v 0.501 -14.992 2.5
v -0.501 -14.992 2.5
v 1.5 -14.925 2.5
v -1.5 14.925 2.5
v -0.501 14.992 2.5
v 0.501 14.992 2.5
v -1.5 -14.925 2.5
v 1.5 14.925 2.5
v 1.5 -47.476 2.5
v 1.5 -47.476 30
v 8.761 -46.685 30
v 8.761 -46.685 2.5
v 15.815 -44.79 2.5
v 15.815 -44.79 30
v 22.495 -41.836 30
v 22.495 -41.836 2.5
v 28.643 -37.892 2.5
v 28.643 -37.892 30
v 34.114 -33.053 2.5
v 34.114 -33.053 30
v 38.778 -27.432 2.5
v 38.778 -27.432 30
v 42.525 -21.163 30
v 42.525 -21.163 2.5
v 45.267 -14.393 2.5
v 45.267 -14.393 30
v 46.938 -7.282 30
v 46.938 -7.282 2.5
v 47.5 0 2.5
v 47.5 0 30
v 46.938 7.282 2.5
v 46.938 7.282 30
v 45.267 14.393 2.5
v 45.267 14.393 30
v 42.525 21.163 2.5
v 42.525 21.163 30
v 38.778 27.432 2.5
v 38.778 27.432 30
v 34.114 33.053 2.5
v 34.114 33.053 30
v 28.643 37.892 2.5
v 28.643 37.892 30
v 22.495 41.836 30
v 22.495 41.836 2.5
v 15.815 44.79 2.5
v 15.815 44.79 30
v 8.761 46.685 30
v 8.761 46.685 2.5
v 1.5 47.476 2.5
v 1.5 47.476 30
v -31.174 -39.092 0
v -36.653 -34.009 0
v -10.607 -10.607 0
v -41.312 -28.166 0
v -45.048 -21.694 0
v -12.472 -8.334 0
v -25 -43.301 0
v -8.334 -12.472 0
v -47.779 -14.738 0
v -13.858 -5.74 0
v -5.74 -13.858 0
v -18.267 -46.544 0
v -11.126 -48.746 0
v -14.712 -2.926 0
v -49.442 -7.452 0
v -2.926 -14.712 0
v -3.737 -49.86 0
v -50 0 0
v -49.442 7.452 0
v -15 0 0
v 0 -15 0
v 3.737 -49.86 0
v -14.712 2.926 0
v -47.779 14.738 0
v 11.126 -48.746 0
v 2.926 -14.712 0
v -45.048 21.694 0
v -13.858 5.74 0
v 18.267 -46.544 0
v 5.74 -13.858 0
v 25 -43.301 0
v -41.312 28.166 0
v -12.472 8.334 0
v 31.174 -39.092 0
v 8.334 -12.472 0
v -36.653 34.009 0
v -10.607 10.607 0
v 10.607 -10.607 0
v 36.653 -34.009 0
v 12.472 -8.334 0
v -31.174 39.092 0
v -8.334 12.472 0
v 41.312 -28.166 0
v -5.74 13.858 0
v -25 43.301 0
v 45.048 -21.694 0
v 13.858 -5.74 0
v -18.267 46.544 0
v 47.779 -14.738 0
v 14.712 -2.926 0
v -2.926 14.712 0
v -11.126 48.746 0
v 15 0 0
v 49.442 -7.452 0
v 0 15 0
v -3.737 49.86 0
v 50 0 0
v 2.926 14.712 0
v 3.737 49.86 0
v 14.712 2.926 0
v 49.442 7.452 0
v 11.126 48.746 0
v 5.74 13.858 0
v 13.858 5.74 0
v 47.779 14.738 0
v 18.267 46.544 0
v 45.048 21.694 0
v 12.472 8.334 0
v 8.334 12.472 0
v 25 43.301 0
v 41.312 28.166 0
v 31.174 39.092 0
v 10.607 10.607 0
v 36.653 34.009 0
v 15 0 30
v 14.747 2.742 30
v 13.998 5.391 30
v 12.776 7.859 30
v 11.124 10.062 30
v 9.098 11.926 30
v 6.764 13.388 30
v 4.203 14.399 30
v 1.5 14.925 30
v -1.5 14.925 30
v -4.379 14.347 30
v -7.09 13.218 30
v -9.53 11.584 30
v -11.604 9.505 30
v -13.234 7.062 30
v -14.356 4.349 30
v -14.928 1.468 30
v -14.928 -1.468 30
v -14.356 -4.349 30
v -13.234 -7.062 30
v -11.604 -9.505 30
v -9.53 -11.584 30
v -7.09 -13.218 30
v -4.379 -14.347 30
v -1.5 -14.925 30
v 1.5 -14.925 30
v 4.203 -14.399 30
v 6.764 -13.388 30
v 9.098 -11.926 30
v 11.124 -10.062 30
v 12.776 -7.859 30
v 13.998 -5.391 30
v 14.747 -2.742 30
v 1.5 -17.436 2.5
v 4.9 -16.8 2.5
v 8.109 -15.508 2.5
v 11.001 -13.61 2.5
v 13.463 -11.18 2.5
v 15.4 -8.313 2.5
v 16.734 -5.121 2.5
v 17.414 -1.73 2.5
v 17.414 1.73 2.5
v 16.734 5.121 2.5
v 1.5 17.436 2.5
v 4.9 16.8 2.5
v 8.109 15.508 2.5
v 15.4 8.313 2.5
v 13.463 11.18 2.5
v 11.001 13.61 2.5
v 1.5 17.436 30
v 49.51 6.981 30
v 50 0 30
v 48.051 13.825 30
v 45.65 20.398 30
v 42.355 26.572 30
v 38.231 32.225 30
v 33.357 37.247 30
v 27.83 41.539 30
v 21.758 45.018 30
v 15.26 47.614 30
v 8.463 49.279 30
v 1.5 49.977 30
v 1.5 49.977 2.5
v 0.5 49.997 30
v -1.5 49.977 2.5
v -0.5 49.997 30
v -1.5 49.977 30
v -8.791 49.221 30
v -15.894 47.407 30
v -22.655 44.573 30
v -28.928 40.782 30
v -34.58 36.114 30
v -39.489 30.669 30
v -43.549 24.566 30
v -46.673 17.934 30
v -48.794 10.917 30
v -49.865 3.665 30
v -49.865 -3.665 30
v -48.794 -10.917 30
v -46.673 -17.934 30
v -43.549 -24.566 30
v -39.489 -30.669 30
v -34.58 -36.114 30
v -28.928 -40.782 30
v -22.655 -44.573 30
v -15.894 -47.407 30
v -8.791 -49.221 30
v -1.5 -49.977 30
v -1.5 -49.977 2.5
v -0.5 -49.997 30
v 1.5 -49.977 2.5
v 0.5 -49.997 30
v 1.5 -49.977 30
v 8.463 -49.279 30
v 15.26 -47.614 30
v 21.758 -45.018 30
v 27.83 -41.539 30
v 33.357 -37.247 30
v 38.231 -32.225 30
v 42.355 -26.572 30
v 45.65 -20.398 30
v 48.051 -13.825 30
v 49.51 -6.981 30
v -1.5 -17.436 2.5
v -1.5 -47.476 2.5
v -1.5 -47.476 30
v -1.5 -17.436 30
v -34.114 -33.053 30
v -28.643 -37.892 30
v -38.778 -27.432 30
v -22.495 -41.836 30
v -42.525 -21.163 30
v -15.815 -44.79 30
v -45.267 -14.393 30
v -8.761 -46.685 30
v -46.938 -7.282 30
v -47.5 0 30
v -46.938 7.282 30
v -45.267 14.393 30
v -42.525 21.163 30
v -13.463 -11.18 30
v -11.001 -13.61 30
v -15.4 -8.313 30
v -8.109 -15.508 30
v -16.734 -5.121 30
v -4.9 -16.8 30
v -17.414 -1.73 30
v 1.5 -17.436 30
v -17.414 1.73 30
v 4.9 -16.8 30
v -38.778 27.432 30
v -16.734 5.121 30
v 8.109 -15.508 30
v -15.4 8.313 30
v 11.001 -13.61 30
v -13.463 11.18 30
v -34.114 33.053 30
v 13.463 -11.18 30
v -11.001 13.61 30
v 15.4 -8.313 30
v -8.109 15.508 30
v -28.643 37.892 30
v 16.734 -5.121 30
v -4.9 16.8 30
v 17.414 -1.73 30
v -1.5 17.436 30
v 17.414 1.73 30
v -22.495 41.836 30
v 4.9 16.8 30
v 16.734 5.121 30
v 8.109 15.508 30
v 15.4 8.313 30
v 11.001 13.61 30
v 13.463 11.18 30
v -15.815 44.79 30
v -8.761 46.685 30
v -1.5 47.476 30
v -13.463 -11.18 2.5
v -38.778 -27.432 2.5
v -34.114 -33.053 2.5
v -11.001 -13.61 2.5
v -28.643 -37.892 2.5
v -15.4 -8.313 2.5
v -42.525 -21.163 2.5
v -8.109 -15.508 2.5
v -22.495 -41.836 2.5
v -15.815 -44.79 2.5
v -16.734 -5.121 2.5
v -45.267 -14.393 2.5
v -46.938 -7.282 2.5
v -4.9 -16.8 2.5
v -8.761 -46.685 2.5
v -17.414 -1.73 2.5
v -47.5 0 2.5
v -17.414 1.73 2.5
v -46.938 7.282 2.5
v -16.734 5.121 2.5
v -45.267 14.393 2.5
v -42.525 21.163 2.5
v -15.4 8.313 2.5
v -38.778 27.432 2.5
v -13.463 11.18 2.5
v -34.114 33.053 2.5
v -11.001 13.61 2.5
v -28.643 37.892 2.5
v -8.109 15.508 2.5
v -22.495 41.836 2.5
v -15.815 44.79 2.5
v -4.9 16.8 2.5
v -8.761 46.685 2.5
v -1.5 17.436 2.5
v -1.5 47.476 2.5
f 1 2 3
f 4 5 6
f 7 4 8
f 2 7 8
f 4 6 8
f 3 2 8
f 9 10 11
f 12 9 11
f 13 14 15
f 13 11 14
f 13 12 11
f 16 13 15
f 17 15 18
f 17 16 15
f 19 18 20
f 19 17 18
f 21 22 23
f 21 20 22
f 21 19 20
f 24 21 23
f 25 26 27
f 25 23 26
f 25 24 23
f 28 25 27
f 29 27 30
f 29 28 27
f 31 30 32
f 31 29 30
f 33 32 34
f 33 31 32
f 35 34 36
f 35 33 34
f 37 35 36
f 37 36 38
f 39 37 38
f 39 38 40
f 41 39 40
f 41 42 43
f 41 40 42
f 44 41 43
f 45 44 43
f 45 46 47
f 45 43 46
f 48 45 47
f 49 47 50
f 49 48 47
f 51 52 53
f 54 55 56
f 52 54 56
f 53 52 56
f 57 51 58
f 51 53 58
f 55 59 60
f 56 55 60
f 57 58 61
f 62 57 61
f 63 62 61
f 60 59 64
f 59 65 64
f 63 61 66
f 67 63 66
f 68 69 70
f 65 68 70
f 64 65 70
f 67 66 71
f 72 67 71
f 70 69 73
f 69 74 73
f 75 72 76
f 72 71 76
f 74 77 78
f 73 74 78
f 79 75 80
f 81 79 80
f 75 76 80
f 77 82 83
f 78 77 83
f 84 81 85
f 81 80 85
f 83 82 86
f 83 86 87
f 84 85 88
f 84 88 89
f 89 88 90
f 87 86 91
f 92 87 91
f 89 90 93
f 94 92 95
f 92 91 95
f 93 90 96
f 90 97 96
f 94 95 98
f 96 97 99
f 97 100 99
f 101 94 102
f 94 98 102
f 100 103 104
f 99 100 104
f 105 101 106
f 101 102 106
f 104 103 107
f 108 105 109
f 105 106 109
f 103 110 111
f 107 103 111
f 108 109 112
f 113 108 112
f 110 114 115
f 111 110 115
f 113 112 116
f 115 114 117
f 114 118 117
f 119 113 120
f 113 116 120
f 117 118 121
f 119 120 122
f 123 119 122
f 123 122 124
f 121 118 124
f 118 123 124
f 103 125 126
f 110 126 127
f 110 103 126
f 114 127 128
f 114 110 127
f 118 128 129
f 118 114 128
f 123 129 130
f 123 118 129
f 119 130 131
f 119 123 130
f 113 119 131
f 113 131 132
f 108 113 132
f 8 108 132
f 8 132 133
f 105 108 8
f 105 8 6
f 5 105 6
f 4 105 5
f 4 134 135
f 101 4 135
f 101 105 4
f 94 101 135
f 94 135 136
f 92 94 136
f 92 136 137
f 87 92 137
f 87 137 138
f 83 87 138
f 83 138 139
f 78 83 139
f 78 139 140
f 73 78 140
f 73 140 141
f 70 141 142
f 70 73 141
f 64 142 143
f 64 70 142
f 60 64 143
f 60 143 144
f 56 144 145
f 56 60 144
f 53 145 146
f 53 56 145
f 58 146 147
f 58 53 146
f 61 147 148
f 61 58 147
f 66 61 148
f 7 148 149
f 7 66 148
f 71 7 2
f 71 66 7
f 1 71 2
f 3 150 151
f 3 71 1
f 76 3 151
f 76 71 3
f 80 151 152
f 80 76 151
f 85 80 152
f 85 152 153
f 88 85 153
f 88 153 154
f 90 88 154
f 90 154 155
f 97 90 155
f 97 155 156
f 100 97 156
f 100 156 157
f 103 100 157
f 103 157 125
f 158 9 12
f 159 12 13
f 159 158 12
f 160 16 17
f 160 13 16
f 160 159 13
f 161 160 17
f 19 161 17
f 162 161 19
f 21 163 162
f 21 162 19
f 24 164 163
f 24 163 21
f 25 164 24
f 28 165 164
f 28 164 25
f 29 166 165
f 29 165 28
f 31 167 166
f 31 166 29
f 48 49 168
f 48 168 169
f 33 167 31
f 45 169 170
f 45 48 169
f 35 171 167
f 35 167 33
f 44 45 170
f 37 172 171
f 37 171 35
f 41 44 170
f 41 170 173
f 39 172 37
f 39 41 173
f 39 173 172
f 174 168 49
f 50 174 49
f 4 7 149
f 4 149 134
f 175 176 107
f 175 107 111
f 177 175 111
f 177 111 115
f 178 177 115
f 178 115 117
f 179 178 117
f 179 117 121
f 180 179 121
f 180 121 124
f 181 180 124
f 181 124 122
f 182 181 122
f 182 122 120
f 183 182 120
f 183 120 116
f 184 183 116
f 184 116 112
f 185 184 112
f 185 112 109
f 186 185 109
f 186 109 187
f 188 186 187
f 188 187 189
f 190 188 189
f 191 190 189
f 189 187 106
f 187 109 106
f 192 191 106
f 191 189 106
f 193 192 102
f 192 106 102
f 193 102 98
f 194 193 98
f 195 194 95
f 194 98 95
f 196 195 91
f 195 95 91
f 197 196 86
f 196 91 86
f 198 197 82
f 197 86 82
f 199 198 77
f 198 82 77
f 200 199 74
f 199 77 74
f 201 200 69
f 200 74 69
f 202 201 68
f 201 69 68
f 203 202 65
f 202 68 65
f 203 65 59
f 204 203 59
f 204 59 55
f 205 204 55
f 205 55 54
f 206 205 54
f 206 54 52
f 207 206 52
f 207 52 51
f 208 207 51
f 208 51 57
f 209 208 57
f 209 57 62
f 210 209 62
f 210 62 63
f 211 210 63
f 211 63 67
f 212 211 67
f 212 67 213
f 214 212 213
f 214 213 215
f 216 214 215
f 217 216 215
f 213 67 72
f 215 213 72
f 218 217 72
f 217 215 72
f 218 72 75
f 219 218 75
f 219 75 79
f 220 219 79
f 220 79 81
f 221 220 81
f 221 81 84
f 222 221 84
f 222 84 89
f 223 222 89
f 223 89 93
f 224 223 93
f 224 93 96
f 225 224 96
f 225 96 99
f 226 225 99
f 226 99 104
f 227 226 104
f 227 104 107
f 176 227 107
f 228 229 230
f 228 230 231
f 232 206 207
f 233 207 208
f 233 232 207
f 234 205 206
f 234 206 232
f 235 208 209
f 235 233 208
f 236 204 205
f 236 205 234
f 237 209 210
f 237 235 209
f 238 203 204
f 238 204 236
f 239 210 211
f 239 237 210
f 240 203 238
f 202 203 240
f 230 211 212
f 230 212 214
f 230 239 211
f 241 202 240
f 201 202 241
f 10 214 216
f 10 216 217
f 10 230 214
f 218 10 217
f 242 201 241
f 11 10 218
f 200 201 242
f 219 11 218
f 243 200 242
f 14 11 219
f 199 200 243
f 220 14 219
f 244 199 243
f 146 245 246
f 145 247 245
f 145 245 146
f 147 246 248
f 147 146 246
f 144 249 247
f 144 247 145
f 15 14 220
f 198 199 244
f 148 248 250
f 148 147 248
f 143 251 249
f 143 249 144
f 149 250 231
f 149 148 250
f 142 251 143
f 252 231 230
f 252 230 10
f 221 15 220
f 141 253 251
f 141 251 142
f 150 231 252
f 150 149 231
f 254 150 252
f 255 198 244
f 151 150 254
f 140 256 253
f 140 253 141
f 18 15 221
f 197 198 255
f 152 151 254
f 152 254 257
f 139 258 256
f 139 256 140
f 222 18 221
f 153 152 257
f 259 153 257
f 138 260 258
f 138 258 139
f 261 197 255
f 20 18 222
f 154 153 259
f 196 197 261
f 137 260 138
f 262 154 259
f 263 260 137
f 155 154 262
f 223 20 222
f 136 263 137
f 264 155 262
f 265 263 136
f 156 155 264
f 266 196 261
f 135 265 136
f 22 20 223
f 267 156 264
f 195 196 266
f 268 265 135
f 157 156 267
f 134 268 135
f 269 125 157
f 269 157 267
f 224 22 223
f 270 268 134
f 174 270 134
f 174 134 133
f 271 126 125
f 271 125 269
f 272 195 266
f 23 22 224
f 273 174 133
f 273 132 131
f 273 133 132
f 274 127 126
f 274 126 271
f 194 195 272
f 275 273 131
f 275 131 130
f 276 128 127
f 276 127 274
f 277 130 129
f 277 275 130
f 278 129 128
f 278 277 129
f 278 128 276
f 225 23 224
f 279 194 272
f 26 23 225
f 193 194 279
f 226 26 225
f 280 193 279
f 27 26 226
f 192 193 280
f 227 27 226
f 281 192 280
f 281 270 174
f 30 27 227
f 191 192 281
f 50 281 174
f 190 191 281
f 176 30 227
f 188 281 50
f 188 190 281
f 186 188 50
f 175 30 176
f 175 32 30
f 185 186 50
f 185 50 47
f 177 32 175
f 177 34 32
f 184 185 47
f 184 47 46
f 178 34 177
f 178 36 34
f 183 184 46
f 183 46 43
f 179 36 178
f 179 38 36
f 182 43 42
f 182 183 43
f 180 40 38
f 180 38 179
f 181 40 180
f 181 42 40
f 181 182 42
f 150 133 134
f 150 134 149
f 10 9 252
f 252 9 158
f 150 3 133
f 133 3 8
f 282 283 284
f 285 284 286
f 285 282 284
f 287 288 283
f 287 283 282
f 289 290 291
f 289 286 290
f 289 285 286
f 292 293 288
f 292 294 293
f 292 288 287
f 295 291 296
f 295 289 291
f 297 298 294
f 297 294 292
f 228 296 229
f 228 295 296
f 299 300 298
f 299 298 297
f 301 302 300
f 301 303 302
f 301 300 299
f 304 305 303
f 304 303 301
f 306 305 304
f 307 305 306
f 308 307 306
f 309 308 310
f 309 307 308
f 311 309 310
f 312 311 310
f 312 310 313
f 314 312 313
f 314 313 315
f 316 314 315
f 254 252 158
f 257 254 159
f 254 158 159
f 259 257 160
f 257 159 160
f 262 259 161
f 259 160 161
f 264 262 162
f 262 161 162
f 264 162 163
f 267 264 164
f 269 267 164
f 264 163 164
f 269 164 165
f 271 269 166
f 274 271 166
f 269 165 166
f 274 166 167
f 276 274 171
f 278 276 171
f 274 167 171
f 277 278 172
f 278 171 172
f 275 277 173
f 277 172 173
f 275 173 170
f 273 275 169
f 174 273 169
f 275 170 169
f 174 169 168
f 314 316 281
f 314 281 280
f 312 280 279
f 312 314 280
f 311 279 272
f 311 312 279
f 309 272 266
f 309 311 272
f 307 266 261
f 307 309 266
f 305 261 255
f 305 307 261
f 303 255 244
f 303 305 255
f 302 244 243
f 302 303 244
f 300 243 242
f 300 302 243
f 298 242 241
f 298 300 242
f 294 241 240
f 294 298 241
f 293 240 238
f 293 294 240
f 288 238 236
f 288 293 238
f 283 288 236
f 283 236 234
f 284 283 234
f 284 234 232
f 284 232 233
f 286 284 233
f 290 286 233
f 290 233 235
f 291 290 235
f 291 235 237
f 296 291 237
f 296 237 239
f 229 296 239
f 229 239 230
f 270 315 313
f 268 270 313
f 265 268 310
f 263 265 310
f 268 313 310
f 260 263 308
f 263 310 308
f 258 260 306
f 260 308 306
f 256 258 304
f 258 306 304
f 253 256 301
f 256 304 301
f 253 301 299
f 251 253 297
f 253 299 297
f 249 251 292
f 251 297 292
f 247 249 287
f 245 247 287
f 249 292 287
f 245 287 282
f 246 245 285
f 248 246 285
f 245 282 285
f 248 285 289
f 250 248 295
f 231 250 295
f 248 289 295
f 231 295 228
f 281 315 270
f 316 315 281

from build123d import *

# Parameters (mm, degrees)
F0_R     = 50
F0_R_2   = 15
F4_DEPTH = 30
F1_T     = -2.5
F2_W     = 3
F2_H     = 99.95499
F5_DEPTH = 27.5


with BuildPart() as f4:
    # F0 (on Top) → F4 (new body)
    with BuildSketch(Plane.XY):
        Circle(F0_R)
        Circle(F0_R_2, mode=Mode.SUBTRACT)
    extrude(amount=F4_DEPTH)

    # F1
    f1_openings = [f4.faces().sort_by_distance(p)[0] for p in [
        (-48.585786, 0, 30),
    ]]
    offset(amount=F1_T, openings=f1_openings)

    # F2 (on face) → F5 (join)
    with BuildSketch(Plane.XY.offset(2.5)):
        Rectangle(F2_W, F2_H)
    extrude(amount=F5_DEPTH)


solid = f4.part
